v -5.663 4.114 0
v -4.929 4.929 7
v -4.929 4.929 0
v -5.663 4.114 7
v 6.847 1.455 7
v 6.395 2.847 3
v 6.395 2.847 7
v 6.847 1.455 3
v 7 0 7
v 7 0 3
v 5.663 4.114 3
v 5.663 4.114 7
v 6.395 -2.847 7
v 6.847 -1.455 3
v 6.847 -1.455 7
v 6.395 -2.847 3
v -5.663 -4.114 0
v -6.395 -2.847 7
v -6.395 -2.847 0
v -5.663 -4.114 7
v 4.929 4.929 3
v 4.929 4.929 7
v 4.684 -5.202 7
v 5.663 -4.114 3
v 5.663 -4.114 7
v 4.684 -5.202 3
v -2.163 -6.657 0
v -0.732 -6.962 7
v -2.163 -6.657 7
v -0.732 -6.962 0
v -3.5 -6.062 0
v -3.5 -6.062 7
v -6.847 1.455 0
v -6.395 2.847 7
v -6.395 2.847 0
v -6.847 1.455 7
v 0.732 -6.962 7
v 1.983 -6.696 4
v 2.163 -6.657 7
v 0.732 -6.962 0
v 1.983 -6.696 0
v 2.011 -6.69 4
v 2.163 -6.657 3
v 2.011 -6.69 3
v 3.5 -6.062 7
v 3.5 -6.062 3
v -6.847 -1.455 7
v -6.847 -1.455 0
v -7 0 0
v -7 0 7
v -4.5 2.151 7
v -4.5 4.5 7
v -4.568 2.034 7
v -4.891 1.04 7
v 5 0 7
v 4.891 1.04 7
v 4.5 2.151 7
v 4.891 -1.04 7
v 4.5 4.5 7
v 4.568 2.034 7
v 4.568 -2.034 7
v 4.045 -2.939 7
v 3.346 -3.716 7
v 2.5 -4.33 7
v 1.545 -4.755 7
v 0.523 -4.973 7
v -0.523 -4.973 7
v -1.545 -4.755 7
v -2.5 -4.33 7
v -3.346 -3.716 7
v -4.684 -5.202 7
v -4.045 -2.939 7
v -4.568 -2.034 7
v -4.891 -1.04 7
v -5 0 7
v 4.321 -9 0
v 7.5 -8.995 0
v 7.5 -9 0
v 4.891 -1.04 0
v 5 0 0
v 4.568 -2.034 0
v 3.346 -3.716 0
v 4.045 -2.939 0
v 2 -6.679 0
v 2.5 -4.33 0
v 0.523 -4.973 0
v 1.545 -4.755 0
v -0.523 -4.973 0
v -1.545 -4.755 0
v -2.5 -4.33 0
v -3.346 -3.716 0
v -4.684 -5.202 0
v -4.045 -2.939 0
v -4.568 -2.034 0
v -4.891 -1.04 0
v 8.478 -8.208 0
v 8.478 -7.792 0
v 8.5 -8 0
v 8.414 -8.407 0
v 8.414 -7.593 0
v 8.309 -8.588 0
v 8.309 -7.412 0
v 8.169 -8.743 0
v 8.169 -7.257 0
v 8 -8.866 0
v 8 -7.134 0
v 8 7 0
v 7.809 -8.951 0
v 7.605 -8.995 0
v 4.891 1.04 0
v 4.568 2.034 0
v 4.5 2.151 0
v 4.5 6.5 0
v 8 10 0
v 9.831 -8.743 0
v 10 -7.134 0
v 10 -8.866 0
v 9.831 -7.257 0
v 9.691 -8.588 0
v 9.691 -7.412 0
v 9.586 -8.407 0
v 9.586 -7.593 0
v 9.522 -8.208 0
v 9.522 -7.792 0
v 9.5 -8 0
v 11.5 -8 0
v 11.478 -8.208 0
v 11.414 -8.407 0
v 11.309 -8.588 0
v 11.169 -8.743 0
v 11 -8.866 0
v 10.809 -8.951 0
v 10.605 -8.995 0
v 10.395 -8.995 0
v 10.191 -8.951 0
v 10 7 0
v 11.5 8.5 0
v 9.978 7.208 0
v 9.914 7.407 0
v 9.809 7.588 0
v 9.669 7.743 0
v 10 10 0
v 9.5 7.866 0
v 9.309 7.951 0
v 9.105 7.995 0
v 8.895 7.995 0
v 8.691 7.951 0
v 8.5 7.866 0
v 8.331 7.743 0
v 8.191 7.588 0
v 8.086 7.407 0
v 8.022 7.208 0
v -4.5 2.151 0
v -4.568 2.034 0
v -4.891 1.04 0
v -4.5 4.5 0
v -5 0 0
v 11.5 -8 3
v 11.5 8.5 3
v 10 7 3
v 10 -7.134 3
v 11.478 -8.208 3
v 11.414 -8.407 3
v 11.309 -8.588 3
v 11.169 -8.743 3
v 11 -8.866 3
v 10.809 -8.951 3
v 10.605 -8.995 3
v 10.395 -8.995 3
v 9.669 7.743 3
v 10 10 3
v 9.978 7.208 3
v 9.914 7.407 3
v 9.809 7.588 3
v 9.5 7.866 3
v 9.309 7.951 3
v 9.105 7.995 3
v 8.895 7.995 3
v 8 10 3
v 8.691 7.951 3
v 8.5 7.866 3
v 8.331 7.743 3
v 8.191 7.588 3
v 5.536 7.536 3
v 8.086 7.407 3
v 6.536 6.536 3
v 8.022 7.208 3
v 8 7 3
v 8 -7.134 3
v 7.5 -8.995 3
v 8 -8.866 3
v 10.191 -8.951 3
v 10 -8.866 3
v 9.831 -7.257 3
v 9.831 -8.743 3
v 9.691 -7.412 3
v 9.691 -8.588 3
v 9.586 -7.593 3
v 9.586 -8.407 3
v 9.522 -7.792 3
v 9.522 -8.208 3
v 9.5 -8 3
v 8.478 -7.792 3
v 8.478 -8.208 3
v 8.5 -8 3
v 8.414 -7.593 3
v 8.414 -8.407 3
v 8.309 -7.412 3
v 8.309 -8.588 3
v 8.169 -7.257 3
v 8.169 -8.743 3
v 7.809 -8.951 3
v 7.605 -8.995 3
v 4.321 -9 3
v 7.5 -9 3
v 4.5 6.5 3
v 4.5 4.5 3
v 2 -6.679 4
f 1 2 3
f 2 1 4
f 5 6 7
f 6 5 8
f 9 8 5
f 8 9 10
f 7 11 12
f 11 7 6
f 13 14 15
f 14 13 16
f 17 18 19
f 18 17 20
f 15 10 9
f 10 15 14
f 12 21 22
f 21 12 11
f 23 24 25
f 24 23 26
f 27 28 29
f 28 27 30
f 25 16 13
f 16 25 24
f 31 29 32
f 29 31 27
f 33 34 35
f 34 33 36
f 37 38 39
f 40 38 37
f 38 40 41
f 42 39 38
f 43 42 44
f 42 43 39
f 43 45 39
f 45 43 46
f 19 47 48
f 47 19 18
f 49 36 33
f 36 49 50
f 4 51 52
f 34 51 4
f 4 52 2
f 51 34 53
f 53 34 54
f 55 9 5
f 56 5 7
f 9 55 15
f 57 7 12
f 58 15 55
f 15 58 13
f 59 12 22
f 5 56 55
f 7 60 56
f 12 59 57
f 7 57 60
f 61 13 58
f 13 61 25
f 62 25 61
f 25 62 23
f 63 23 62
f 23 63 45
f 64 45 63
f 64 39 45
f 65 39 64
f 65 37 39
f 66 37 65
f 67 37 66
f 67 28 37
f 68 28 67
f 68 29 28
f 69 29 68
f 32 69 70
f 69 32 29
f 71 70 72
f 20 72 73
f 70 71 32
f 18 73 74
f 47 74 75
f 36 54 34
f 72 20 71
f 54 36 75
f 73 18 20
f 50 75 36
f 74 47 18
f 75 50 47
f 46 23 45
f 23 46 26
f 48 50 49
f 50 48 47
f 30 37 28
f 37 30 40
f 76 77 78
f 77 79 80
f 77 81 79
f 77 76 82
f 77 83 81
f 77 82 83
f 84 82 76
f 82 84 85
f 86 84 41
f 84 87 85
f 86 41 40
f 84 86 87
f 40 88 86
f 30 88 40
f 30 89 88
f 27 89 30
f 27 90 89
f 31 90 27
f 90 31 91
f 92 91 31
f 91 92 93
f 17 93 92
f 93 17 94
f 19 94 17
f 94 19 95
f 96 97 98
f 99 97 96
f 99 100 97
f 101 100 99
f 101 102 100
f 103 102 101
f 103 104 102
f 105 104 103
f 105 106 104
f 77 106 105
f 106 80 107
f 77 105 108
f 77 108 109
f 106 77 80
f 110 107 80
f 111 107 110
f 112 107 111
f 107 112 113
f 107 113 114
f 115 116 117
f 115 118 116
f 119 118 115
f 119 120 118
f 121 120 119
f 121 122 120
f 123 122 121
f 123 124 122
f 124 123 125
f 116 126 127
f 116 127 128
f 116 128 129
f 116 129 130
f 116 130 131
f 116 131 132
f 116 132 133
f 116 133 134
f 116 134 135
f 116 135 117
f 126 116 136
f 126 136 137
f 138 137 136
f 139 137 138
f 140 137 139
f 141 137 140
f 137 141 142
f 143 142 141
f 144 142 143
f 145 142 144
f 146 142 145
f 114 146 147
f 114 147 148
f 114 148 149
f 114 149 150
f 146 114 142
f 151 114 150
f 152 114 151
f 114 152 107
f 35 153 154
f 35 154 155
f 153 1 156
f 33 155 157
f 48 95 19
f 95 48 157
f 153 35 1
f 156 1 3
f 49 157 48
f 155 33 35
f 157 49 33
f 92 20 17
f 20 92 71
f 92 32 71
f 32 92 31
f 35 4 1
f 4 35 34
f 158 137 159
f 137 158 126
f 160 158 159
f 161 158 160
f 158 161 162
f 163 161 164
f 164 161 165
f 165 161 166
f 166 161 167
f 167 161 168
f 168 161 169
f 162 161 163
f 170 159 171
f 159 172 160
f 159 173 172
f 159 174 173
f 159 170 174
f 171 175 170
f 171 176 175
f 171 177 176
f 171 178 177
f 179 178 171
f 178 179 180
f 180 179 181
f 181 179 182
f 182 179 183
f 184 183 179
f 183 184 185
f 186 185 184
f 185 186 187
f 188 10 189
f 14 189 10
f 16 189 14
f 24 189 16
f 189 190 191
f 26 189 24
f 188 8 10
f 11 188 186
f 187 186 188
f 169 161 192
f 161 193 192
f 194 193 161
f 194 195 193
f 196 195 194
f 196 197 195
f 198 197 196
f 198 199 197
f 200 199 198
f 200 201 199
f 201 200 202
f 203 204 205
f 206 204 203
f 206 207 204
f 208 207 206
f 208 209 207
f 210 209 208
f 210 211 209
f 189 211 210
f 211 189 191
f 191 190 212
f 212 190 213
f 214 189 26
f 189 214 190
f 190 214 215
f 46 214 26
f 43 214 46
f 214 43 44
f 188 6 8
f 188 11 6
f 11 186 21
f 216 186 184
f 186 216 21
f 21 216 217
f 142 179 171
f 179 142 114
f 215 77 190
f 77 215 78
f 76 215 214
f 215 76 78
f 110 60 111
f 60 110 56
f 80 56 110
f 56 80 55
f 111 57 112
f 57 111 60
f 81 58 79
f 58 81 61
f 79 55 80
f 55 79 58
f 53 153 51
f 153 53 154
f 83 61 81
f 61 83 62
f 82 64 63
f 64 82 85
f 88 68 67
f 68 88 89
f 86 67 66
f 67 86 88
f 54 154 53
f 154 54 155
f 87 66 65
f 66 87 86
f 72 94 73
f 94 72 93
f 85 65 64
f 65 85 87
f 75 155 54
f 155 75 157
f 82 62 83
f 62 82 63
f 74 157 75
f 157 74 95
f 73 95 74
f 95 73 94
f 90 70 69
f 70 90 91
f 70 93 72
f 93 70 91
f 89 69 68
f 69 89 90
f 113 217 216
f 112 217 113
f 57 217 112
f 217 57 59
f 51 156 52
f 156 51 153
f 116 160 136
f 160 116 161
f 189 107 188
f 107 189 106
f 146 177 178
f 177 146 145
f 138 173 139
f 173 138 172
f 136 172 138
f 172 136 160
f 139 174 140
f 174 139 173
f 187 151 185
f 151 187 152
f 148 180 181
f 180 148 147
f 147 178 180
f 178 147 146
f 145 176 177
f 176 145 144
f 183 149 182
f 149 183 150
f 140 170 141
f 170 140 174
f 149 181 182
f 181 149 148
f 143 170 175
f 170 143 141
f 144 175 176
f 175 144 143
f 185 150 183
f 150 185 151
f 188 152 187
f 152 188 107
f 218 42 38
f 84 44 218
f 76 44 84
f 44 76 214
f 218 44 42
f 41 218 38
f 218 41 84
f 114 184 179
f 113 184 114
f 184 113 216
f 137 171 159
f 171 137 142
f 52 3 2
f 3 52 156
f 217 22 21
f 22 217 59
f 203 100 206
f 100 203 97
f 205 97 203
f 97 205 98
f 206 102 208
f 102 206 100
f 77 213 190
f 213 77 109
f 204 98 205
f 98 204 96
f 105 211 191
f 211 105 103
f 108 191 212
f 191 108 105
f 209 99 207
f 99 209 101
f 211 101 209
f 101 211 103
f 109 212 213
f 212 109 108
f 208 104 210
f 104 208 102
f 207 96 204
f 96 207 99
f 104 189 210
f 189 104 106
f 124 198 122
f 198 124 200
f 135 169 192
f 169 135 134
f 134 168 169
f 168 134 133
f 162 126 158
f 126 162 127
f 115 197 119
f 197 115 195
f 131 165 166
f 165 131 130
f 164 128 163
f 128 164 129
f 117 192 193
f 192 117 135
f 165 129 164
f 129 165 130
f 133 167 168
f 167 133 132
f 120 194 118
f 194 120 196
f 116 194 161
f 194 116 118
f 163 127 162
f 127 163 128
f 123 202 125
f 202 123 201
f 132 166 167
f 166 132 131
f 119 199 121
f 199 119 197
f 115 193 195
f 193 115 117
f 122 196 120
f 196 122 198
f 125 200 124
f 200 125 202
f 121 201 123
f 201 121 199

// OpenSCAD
// PRUSA iteration3
// LCD cable clip
// GNU GPL v3
// Josef Průša <iam@josefprusa.cz> and contributors
// http://www.reprap.org/wiki/Prusa_Mendel
// http://prusamendel.org


difference(){
    union(){
    cylinder(r=7,h = 7, $fn=30);
    translate([2,-8,0]) cube([9.5,18,3]);
    translate([2,-9,0]) cube([5.5,5,3]);
    }
translate([0,0,-1]) cylinder(r=5,h = 10, $fn=30);
translate([-4.5,0,-5]) cube([9,15,15]);
translate([8,-12,-1]) cube([2,19,5]);
translate([9,7,-1]) cylinder(r=1,h = 5, $fn=30);
    
    //corners
    translate([2,-13.75,-1]) rotate([0,0,45]) cube([5,5,5]);    
    
    translate([4,6,-1]) rotate([0,0,45]) cube([10,10,5]);    
    translate([14,6,-1]) rotate([0,0,45]) cube([10,10,5]);    
    translate([-3,3,-1]) rotate([0,0,45]) cube([5,5,10]);    
    translate([3,3,3]) rotate([0,0,45]) cube([5,5,10]);    
}


translate([7.5,-8,0]) cylinder(r=1,h = 3, $fn=30);
translate([10.5,-8,0]) cylinder(r=1,h = 3, $fn=30);
